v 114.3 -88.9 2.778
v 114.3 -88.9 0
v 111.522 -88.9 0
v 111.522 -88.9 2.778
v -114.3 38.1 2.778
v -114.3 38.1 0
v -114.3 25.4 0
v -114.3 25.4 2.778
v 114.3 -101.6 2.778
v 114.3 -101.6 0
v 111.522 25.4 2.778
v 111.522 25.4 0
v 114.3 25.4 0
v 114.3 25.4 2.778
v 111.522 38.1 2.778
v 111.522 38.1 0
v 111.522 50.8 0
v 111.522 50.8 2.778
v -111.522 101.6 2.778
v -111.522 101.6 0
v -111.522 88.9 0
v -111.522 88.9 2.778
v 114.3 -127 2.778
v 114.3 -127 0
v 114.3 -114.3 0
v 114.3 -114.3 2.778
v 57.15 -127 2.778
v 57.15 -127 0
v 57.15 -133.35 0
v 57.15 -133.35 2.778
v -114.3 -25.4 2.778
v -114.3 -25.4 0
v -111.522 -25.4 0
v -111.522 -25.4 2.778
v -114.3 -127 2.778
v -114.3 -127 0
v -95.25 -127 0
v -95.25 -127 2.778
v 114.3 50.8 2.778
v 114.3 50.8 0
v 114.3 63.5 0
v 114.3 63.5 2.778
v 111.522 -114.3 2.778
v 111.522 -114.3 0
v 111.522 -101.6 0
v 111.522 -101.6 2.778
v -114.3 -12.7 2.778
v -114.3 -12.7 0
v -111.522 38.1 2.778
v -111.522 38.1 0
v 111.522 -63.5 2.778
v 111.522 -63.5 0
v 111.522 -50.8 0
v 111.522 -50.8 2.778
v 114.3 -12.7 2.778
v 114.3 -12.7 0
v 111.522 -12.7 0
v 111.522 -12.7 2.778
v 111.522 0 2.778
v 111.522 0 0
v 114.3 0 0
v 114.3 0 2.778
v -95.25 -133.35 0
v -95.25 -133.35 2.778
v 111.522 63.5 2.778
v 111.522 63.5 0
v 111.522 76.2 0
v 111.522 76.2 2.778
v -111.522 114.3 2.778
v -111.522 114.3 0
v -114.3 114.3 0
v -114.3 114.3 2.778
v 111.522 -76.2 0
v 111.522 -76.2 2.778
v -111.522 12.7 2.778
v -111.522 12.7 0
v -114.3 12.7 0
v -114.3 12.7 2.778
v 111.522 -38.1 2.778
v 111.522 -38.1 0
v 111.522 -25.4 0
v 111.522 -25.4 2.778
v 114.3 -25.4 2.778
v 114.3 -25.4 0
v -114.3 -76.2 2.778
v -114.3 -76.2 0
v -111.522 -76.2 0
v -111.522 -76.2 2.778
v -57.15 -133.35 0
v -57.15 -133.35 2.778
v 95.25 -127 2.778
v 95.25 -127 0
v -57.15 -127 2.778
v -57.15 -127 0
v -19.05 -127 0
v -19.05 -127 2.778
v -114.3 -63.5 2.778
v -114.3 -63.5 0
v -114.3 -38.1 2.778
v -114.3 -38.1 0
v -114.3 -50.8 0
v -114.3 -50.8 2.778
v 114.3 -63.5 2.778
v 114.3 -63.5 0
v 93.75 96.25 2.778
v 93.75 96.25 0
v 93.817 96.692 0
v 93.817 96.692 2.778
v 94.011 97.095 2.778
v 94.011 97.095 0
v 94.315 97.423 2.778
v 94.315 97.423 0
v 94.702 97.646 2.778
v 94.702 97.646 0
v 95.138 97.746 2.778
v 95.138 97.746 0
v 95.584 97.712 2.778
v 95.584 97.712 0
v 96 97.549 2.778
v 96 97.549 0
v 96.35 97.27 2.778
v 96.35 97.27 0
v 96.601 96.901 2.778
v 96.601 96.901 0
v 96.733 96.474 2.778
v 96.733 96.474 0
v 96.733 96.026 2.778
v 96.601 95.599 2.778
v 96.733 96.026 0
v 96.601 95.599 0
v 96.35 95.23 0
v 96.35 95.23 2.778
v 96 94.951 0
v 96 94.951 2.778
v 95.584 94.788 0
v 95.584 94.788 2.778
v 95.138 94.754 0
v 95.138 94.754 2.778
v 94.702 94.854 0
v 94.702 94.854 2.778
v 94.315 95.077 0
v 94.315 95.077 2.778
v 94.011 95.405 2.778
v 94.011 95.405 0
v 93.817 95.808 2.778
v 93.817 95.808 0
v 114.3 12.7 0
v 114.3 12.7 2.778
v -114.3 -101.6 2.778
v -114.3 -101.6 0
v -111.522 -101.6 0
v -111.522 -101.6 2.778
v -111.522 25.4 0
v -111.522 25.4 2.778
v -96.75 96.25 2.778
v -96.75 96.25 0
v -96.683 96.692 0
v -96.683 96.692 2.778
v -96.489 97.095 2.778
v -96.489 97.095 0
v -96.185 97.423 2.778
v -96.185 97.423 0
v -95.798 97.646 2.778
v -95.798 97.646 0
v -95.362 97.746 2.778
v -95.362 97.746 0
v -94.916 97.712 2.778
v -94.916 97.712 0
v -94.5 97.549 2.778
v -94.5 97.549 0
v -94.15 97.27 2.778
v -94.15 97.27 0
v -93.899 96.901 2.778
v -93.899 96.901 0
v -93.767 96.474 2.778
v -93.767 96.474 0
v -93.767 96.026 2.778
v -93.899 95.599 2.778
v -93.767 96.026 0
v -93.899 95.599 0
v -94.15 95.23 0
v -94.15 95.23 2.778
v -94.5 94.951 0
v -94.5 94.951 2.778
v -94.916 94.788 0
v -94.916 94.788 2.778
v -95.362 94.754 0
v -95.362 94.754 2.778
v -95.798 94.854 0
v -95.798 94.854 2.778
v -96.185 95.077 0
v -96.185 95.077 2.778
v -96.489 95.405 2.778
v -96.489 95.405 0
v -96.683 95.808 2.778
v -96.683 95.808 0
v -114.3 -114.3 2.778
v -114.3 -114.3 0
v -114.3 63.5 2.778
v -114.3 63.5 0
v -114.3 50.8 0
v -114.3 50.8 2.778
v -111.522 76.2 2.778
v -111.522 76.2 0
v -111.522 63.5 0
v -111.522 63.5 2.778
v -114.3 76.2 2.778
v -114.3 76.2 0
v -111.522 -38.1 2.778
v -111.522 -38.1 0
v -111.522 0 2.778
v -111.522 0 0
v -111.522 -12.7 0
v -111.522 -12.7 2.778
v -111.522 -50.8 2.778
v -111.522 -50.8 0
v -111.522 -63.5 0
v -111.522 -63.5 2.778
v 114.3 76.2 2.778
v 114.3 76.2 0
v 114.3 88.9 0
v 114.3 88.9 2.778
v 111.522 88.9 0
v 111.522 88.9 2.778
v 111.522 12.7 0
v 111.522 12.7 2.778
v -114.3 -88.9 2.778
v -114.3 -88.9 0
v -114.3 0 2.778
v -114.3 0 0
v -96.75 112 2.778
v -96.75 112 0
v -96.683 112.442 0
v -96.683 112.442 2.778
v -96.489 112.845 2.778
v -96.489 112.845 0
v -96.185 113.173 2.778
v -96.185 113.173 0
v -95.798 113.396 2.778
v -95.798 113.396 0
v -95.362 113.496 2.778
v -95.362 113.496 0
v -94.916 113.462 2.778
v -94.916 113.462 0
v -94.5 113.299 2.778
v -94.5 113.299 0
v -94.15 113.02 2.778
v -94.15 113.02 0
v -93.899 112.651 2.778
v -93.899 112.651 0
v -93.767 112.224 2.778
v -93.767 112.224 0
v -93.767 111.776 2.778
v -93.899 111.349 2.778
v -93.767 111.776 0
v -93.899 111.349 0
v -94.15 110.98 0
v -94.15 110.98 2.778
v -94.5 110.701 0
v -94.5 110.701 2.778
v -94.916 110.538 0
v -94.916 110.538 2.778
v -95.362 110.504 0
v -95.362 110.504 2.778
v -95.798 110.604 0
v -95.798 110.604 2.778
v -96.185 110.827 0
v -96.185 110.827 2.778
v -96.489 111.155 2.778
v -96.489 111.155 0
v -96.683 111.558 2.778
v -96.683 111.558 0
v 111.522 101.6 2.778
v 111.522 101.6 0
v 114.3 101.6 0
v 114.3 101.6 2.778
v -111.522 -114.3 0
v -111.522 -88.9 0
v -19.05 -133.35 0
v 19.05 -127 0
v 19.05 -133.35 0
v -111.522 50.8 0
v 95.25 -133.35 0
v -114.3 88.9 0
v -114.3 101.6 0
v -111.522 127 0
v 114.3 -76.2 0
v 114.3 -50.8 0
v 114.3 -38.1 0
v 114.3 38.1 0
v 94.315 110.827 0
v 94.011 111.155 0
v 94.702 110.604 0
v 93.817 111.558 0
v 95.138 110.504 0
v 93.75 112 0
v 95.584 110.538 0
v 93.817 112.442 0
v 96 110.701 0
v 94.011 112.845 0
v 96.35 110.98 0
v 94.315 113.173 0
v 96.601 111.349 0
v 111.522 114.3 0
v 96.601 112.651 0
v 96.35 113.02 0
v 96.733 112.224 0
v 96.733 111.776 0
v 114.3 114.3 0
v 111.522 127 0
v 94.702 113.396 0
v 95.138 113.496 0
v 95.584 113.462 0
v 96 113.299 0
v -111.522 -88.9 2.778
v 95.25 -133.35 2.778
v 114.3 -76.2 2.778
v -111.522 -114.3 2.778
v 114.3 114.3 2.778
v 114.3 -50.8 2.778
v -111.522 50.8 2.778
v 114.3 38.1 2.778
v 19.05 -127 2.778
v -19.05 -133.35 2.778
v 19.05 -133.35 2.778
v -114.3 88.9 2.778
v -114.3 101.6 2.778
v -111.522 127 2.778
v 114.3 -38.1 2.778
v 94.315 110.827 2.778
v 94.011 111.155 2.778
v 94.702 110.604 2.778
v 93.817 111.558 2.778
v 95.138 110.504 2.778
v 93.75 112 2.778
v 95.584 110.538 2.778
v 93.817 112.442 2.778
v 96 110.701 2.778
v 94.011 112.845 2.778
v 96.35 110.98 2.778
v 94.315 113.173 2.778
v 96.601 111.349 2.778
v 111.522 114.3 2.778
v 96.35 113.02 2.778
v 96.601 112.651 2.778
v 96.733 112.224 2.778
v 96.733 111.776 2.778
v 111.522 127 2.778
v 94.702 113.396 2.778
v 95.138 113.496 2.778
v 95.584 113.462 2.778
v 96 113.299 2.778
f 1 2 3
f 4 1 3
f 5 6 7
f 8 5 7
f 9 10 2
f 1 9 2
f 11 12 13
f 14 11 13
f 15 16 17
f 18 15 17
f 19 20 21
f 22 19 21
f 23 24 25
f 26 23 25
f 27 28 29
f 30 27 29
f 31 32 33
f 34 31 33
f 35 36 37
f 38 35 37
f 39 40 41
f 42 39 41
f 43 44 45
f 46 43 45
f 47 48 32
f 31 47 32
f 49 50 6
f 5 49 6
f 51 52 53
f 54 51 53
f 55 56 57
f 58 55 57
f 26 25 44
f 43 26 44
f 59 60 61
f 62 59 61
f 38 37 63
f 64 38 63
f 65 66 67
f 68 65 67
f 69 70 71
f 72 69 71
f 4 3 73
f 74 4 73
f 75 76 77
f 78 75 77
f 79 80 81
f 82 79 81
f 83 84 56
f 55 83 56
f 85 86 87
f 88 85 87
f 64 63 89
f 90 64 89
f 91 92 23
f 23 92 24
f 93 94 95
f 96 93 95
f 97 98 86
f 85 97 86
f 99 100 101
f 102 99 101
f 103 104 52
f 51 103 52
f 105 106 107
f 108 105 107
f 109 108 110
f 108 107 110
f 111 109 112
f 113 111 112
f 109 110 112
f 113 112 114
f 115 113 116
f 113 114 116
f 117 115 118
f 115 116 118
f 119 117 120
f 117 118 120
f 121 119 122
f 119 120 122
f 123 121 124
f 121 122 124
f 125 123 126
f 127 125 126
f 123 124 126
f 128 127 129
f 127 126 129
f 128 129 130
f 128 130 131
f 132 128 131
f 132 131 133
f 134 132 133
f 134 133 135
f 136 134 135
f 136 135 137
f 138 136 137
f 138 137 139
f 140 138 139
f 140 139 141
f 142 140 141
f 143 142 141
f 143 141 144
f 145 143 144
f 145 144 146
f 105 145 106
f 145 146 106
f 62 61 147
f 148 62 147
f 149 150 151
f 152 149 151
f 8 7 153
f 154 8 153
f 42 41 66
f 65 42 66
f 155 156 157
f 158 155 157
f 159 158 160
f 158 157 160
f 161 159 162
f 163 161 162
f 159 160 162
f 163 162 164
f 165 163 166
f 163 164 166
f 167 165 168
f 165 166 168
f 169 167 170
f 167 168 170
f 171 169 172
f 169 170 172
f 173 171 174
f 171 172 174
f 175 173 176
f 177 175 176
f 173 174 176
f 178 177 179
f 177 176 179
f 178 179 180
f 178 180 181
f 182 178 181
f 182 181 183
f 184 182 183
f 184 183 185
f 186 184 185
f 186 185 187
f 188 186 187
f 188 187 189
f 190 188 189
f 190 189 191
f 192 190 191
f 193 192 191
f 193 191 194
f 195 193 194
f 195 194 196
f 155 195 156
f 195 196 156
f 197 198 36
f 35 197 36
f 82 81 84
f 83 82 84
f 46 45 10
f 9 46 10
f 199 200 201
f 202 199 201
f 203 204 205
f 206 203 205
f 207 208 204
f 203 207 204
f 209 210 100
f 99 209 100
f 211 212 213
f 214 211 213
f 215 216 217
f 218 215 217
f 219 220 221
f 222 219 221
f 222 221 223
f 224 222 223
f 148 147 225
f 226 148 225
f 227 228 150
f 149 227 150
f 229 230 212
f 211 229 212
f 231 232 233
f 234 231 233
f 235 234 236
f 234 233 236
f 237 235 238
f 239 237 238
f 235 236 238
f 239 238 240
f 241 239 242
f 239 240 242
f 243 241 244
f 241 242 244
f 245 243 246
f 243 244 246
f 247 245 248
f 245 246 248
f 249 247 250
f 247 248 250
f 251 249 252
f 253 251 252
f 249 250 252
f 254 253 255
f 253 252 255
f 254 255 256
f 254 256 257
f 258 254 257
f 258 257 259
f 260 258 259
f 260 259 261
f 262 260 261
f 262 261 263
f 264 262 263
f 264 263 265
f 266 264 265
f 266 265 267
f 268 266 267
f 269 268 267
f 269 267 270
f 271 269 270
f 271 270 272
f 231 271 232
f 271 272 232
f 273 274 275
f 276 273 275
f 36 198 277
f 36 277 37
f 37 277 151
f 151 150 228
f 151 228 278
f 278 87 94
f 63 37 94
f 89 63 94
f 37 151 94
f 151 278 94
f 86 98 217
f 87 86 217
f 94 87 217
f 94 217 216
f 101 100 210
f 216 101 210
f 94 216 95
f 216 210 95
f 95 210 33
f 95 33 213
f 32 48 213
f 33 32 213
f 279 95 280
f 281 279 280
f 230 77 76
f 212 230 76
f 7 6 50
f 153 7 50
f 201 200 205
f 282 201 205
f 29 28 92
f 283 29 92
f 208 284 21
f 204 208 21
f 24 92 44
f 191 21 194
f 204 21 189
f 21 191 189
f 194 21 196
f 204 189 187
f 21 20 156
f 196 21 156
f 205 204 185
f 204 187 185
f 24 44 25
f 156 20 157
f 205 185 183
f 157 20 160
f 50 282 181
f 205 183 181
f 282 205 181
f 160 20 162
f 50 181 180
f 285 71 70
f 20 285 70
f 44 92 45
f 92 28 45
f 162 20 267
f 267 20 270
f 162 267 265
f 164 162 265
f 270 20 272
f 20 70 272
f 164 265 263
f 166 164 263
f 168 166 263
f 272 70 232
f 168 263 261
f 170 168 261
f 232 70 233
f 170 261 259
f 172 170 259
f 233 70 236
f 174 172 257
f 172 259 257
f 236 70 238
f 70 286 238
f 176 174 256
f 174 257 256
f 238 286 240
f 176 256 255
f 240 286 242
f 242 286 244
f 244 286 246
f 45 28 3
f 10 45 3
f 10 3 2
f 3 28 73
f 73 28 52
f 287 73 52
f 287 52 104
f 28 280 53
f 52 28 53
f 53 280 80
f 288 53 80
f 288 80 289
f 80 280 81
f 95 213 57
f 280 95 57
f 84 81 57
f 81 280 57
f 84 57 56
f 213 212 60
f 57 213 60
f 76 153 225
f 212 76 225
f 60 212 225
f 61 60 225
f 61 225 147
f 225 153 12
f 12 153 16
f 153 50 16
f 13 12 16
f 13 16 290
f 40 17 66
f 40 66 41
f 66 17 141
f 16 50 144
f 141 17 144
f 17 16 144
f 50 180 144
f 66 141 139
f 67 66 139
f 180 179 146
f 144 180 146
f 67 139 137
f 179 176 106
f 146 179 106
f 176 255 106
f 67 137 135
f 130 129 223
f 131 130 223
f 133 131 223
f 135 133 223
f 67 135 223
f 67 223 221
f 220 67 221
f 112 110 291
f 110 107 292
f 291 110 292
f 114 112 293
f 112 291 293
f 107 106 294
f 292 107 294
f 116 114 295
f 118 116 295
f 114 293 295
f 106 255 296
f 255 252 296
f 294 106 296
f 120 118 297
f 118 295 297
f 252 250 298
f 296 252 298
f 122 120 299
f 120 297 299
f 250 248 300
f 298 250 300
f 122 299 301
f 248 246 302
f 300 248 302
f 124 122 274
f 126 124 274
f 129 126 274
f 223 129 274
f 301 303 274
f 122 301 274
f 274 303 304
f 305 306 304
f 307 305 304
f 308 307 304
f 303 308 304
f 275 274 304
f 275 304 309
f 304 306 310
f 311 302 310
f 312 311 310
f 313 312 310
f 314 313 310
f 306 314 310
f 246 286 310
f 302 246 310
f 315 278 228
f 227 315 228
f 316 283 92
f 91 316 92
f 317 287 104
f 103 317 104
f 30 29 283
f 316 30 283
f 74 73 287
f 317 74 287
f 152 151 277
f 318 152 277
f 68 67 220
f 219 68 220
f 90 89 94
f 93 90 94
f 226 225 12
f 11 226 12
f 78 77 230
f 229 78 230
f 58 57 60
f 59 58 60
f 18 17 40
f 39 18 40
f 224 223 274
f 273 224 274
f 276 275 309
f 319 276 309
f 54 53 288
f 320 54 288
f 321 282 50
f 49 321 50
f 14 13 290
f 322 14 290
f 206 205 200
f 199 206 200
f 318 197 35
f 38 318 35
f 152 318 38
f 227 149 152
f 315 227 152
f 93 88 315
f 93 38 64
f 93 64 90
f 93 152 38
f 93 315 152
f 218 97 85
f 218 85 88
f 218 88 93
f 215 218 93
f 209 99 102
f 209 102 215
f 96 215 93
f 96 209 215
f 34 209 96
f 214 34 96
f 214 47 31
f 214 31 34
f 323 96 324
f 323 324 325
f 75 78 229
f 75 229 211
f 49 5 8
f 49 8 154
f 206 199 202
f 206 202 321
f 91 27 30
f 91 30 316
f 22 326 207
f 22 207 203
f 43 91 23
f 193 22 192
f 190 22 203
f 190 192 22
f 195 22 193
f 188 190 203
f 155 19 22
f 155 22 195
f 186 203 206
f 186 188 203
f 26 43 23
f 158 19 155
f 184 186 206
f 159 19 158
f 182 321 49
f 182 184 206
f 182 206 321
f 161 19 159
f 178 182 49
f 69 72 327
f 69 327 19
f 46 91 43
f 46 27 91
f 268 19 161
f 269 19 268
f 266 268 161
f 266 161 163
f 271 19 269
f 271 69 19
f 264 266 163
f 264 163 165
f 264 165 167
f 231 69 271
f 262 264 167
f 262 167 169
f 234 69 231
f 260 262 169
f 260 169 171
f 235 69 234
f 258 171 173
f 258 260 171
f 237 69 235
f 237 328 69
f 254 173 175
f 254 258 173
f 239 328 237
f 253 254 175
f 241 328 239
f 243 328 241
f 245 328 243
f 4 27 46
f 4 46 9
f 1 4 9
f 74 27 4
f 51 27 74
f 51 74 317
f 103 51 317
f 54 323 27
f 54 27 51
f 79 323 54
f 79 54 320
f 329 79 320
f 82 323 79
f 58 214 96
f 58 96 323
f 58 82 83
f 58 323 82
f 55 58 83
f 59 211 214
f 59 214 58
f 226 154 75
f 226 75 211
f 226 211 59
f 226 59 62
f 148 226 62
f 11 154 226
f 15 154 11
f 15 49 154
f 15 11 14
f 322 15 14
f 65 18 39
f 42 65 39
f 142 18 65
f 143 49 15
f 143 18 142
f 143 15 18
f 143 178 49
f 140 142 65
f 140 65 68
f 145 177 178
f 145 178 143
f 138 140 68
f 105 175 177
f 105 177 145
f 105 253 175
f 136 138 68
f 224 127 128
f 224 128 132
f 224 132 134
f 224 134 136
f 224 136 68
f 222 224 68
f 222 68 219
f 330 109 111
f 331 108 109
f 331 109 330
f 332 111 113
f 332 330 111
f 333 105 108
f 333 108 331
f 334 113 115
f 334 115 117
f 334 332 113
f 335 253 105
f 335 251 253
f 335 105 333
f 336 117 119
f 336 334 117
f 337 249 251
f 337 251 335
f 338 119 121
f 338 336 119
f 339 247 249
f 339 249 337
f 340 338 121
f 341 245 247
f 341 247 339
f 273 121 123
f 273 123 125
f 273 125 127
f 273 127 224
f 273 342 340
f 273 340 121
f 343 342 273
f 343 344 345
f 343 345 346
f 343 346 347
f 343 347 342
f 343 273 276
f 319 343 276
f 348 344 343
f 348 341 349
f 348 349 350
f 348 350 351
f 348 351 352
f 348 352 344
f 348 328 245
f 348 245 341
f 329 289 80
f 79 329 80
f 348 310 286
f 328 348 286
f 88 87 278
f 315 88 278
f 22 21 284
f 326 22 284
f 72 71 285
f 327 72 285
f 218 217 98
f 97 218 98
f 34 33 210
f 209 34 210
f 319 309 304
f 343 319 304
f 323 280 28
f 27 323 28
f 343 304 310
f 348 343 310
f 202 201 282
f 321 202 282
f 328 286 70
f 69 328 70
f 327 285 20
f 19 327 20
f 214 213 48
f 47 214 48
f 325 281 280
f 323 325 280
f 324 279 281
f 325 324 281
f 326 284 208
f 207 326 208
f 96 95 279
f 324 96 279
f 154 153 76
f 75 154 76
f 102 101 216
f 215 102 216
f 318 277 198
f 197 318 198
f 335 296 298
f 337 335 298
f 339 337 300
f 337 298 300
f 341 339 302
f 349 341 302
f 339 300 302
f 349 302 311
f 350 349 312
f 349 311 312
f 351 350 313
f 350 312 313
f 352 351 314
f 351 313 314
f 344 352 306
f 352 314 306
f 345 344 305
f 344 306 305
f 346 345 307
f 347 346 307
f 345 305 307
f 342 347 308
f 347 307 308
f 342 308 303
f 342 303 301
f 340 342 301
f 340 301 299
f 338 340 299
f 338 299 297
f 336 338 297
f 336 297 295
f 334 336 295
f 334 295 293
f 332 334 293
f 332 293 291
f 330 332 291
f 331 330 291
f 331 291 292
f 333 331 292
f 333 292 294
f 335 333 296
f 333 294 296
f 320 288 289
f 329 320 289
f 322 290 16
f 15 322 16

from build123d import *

# Parameters (mm, degrees)
BOSS_EXTRUDE1_DEPTH = 2.778125
SKETCH3_R           = 1.5
SKETCH3_R_2         = 1.499997
CUT_EXTRUDE2_DEPTH  = 2.778125


with BuildPart() as part:
    # Sketch1 → Boss-Extrude1 (new body)
    with BuildSketch(Plane.XY):
        Polygon((-111.521875, 114.3), (-114.3, 114.3), (-114.3, 101.6), (-111.521875, 101.6), (-111.521875, 88.9), (-114.3, 88.9), (-114.3, 76.2), (-111.521875, 76.2), (-111.521875, 63.5), (-114.3, 63.5), (-114.3, 50.8), (-111.521875, 50.8), (-111.521875, 38.1), (-114.3, 38.1), (-114.3, 25.4), (-111.521875, 25.4), (-111.521875, 12.7), (-114.3, 12.7), (-114.3, 0), (-111.521875, 0), (-111.521875, -12.7), (-114.3, -12.7), (-114.3, -25.4), (-111.521875, -25.4), (-111.521875, -38.1), (-114.3, -38.1), (-114.3, -50.8), (-111.521875, -50.8), (-111.521875, -63.5), (-114.3, -63.5), (-114.3, -76.2), (-111.521875, -76.2), (-111.521875, -88.9), (-114.3, -88.9), (-114.3, -101.6), (-111.521875, -101.6), (-111.521875, -114.3), (-114.3, -114.3), (-114.3, -127), (-95.25, -127), (-95.25, -133.35), (-57.15, -133.35), (-57.15, -127), (-19.05, -127), (-19.05, -133.35), (19.05, -133.35), (19.05, -127), (57.15, -127), (57.15, -133.35), (95.25, -133.35), (95.25, -127), (114.3, -127), (114.3, -114.3), (111.521875, -114.3), (111.521875, -101.6), (114.3, -101.6), (114.3, -88.9), (111.521875, -88.9), (111.521875, -76.2), (114.3, -76.2), (114.3, -63.5), (111.521875, -63.5), (111.521875, -50.8), (114.3, -50.8), (114.3, -38.1), (111.521875, -38.1), (111.521875, -25.4), (114.3, -25.4), (114.3, -12.7), (111.521875, -12.7), (111.521875, 0), (114.3, 0), (114.3, 12.7), (111.521875, 12.7), (111.521875, 25.4), (114.3, 25.4), (114.3, 38.1), (111.521875, 38.1), (111.521875, 50.8), (114.3, 50.8), (114.3, 63.5), (111.521875, 63.5), (111.521875, 76.2), (114.3, 76.2), (114.3, 88.9), (111.521875, 88.9), (111.521875, 101.6), (114.3, 101.6), (114.3, 114.3), (111.521875, 114.3), (111.521875, 127), (-111.521875, 127), align=None)
    extrude(amount=BOSS_EXTRUDE1_DEPTH)

    # Sketch3 → Cut-Extrude2 (cut)
    with BuildSketch(Plane(origin=(0, 0, 0), x_dir=(-1, 0, 0), z_dir=(0, 0, -1))):
        with Locations((-95.25, 112)):
            Circle(SKETCH3_R)
        with Locations((-95.25, 96.25)):
            Circle(SKETCH3_R_2)
        with Locations((95.25, 96.25)):
            Circle(SKETCH3_R_2)
        with Locations((95.25, 112)):
            Circle(SKETCH3_R)
    extrude(amount=-CUT_EXTRUDE2_DEPTH, mode=Mode.SUBTRACT)


solid = part.part
